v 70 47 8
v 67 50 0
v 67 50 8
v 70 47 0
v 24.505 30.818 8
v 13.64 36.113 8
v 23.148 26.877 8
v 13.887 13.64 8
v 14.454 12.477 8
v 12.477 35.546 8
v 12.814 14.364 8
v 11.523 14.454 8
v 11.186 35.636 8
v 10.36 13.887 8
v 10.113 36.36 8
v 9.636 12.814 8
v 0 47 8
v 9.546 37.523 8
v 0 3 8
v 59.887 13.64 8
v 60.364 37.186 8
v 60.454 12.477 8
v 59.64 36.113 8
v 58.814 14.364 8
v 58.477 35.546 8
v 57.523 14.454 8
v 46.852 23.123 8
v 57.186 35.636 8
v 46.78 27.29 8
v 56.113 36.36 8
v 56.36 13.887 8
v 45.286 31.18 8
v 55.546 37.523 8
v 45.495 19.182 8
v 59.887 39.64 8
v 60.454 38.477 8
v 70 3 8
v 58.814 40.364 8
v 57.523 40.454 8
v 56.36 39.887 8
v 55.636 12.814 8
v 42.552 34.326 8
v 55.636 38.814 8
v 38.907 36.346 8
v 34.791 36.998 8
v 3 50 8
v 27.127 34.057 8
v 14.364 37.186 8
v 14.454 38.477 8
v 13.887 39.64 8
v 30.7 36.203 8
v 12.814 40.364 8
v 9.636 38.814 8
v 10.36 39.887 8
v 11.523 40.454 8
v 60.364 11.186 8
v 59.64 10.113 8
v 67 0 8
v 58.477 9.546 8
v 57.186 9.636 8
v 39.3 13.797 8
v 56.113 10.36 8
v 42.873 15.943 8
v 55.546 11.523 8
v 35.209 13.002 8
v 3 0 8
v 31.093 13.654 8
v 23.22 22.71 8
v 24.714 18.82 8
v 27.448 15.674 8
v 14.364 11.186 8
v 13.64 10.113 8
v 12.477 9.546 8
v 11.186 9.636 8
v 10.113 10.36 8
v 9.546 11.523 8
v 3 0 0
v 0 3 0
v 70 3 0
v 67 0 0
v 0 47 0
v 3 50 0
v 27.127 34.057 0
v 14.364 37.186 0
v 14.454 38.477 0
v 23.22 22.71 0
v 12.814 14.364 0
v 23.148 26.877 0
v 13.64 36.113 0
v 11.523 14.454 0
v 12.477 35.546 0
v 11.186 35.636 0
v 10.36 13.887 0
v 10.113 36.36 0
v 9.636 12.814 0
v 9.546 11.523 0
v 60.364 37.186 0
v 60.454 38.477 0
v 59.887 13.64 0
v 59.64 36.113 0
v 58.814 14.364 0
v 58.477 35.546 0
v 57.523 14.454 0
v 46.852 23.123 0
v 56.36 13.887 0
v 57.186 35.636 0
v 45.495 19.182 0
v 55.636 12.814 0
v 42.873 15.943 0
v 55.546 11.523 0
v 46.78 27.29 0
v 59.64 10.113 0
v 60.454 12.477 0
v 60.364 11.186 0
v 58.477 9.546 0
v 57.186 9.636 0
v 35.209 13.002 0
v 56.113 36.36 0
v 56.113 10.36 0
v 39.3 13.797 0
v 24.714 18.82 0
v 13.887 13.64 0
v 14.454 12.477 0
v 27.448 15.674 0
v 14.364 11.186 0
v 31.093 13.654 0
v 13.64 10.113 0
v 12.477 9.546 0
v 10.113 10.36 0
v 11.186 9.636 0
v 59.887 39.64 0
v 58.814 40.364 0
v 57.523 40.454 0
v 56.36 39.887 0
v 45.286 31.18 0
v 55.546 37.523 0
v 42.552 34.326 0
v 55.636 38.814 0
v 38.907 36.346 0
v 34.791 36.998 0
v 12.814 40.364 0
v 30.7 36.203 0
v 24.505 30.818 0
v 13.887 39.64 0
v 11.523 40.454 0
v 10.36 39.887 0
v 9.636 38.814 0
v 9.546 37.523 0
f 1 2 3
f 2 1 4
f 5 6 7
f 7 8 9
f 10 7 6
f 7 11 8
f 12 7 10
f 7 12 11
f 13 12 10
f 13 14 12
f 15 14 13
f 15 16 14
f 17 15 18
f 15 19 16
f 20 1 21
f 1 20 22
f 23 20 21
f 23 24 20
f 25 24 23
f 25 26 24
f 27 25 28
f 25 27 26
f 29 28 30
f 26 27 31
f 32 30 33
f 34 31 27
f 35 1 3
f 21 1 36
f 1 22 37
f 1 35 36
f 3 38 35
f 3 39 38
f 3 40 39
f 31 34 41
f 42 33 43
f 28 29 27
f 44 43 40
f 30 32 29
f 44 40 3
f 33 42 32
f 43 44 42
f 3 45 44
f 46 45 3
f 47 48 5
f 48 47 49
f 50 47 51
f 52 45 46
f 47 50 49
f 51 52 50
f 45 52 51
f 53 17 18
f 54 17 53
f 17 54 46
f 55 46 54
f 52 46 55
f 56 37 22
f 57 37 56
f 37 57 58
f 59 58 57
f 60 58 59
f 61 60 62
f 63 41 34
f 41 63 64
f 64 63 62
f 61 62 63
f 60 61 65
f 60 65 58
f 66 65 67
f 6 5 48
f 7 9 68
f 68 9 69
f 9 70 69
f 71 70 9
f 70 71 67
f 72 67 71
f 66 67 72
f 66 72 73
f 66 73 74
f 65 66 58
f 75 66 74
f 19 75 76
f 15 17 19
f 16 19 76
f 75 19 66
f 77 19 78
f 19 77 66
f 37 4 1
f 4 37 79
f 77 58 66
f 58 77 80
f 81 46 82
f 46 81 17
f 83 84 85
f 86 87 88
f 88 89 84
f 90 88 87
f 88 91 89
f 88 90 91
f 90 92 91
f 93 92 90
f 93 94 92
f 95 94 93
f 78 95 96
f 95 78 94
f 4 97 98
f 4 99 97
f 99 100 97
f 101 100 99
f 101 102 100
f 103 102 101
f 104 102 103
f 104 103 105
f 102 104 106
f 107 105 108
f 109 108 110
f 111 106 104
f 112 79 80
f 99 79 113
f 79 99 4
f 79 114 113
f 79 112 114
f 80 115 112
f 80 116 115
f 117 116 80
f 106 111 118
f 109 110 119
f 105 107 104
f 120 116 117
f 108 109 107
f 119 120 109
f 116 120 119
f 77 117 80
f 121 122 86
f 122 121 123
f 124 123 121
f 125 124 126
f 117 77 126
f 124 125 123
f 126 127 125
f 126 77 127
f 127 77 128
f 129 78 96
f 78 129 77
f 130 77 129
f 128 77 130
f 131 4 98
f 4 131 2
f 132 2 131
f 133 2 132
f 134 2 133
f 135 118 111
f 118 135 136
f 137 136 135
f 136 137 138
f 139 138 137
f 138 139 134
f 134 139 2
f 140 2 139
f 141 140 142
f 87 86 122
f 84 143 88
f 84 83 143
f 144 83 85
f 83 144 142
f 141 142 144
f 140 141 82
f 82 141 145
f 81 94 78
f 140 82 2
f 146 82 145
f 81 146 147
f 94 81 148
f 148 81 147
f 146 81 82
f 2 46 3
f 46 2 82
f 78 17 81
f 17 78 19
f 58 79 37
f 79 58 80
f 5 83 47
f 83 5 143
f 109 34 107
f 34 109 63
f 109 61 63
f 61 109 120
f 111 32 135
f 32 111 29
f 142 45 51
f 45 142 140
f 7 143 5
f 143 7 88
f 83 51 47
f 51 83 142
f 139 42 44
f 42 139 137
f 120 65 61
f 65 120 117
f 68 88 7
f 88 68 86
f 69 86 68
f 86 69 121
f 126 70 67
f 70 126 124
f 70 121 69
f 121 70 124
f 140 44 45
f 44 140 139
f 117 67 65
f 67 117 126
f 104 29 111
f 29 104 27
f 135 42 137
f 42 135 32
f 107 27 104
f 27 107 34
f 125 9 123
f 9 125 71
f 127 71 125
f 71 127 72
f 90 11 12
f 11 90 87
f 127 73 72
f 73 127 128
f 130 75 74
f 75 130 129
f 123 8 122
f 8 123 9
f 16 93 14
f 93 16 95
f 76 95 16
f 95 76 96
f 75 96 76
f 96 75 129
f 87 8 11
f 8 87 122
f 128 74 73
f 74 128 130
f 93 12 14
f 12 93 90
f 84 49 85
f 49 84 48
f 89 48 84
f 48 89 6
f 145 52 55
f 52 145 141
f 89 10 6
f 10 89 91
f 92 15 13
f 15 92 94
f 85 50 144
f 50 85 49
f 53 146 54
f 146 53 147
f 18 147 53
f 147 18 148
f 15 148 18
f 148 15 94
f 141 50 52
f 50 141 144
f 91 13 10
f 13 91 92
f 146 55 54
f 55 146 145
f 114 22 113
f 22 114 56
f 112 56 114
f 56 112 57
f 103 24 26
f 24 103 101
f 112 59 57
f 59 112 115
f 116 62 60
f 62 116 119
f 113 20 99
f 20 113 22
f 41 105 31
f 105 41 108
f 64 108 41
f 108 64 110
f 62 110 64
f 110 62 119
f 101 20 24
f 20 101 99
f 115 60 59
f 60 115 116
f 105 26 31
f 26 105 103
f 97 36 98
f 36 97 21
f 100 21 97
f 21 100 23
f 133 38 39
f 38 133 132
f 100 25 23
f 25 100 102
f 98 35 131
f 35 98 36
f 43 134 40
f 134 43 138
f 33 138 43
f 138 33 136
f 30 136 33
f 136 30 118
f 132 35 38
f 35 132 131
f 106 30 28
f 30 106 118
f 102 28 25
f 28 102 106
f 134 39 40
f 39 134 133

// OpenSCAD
$fn = 32;

// ----------------------------------------------------------------------
// Spacer plate: rect 70 x 50
// ----------------------------------------------------------------------

// --- parameters (mm) ---
bore_r = 12;              // centre bore radius
bolt_r = 2.5;             // bolt hole radius
plate_t = 8;              // plate thickness, Z (extrusion height)
plate_l = 70;             // plate length, X
plate_w = 50;             // plate width, Y
inset = 12;               // corner hole inset

profile = [[3, 0], [67, 0], [70, 3], [70, 47], [67, 50], [3, 50], [0, 47], [0, 3]];  // primary outline, 8 points, counter clockwise
void_1 = [[46.78, 27.29], [45.286, 31.18], [42.552, 34.326], [38.907, 36.346], [34.791, 36.998], [30.7, 36.203], [27.127, 34.057], [24.505, 30.818], [23.148, 26.877], [23.22, 22.71], [24.714, 18.82], [27.448, 15.674], [31.093, 13.654], [35.209, 13.002], [39.3, 13.797], [42.873, 15.943], [45.495, 19.182], [46.852, 23.123]];  // centre bore, 18 points
void_2 = [[14.454, 12.477], [13.887, 13.64], [12.814, 14.364], [11.523, 14.454], [10.36, 13.887], [9.636, 12.814], [9.546, 11.523], [10.113, 10.36], [11.186, 9.636], [12.477, 9.546], [13.64, 10.113], [14.364, 11.186]];  // corner hole, 12 points
void_3 = [[14.454, 38.477], [13.887, 39.64], [12.814, 40.364], [11.523, 40.454], [10.36, 39.887], [9.636, 38.814], [9.546, 37.523], [10.113, 36.36], [11.186, 35.636], [12.477, 35.546], [13.64, 36.113], [14.364, 37.186]];  // corner hole, 12 points
void_4 = [[60.454, 12.477], [59.887, 13.64], [58.814, 14.364], [57.523, 14.454], [56.36, 13.887], [55.636, 12.814], [55.546, 11.523], [56.113, 10.36], [57.186, 9.636], [58.477, 9.546], [59.64, 10.113], [60.364, 11.186]];  // corner hole, 12 points
void_5 = [[60.454, 38.477], [59.887, 39.64], [58.814, 40.364], [57.523, 40.454], [56.36, 39.887], [55.636, 38.814], [55.546, 37.523], [56.113, 36.36], [57.186, 35.636], [58.477, 35.546], [59.64, 36.113], [60.364, 37.186]];  // corner hole, 12 points

// --- the one profile operation ---
difference() {
  linear_extrude(height = plate_t) polygon(points = profile);
  translate([0, 0, -1])
    linear_extrude(height = plate_t + 2) polygon(points = void_1);
  translate([0, 0, -1])
    linear_extrude(height = plate_t + 2) polygon(points = void_2);
  translate([0, 0, -1])
    linear_extrude(height = plate_t + 2) polygon(points = void_3);
  translate([0, 0, -1])
    linear_extrude(height = plate_t + 2) polygon(points = void_4);
  translate([0, 0, -1])
    linear_extrude(height = plate_t + 2) polygon(points = void_5);
}
